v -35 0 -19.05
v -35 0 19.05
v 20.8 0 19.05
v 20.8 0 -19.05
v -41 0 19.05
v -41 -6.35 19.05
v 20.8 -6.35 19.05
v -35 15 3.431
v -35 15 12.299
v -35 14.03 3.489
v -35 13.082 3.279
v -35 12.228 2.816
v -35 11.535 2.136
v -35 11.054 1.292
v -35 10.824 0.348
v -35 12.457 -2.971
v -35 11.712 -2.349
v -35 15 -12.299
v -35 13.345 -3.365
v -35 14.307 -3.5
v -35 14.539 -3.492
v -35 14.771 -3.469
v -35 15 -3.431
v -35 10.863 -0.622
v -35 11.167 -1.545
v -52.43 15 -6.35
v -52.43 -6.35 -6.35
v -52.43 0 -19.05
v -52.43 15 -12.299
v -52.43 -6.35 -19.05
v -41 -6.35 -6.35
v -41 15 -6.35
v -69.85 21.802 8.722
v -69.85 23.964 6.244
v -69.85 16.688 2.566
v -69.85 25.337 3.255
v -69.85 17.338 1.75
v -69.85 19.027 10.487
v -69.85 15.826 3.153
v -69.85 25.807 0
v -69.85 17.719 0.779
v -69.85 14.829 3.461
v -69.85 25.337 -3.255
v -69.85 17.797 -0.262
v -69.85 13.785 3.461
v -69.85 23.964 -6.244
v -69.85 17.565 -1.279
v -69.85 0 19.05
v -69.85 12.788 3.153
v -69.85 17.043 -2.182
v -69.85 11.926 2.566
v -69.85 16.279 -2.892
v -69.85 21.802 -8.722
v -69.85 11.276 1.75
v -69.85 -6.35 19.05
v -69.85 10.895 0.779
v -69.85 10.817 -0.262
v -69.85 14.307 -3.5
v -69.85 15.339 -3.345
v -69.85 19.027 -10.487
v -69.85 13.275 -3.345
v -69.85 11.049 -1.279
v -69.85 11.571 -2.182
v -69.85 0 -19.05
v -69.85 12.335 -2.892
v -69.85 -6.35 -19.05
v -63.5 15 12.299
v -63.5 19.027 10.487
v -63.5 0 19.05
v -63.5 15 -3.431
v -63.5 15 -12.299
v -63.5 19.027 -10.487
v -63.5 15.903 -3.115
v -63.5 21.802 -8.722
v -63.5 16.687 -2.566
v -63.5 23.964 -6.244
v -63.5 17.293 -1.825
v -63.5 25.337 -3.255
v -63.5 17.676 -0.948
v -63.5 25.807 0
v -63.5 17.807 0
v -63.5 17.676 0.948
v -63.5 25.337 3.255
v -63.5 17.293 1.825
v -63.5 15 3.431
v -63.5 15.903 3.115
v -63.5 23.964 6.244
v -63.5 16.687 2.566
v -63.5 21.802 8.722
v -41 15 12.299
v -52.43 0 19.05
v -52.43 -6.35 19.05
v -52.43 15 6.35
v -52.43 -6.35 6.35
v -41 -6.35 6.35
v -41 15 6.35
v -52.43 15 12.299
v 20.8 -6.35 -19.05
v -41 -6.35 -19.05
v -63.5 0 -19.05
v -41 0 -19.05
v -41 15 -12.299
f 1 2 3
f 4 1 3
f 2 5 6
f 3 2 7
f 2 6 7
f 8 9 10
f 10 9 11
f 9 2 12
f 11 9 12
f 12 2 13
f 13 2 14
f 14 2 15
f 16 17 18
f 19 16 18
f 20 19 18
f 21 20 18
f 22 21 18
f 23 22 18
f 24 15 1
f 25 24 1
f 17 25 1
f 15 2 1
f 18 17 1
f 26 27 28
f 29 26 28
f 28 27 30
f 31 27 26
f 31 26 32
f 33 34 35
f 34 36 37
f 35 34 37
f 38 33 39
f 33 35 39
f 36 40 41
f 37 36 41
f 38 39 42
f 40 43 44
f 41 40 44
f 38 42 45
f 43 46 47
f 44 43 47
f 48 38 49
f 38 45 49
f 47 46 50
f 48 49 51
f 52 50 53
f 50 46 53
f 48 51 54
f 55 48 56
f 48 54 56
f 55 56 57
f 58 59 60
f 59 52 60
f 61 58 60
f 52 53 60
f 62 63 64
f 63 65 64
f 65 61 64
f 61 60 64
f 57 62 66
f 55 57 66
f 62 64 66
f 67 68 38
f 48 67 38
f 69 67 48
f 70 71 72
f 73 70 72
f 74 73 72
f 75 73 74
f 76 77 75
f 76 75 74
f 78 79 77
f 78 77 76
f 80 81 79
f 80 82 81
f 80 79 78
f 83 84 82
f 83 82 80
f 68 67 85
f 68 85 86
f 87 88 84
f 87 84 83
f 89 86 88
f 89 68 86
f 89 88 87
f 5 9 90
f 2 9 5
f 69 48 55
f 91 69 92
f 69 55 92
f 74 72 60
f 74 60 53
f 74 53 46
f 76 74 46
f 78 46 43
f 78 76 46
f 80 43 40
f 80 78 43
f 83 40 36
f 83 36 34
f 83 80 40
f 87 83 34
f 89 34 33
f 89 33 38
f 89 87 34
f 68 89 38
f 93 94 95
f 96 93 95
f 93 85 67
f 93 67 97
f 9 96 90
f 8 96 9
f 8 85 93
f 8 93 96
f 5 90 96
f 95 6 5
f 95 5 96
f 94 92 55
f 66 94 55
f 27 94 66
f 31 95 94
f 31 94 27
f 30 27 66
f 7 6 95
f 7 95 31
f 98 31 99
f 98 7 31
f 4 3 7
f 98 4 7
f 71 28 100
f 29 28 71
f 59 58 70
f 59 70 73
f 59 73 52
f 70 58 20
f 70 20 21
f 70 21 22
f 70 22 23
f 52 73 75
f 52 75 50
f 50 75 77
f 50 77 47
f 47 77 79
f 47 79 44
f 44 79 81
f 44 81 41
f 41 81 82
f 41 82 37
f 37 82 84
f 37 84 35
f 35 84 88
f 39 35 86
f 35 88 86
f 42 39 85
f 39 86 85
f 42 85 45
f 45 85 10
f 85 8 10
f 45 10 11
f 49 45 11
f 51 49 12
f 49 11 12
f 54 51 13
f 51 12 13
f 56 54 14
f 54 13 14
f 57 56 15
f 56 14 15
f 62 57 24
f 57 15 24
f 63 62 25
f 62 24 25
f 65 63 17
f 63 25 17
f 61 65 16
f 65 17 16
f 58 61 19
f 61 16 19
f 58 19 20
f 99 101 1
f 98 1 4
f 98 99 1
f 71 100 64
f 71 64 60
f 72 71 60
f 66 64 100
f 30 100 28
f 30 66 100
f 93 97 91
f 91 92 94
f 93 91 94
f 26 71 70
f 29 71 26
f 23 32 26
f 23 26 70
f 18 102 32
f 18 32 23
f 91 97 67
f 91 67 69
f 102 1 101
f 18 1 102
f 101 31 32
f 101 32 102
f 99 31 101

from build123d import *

# Parameters (mm, degrees)
SKETCH5_W                = 33.357089
SKETCH5_H                = 38.1
BOSS_EXTRUDE2_DEPTH      = 20.8
BOSS_EXTRUDE2_DEPTH_BACK = 69.85
SKETCH6_W                = 84.3
SKETCH6_H                = 27.007089
CUT_EXTRUDE1_DEPTH       = 39.1
SKETCH7_R                = 3.5
CUT_EXTRUDE2_DEPTH       = 21.8
CUT_EXTRUDE2_DEPTH_BACK  = 70.85
CUT_EXTRUDE3_DEPTH       = 70.85
SKETCH9_W                = 28.5
SKETCH9_H                = 38.1
BOSS_EXTRUDE3_DEPTH      = 15
CUT_EXTRUDE4_DEPTH       = 70.85
SKETCH11_R               = 3.5
CUT_EXTRUDE5_DEPTH       = 70.85
SKETCH13_W               = 11.43
SKETCH13_H               = 25.4
CUT_EXTRUDE6_DEPTH       = 26.807089
CUT_EXTRUDE6_DEPTH_BACK  = 7.35


with BuildPart() as part:
    # Sketch5 → Boss-Extrude2 (new body, two sides)
    with BuildSketch(Plane(origin=(0, 0, 0), x_dir=(0, -1, 0), z_dir=(1, 0, 0))) as boss_extrude2_sk:
        with Locations((-10.3285445, 0)):
            Rectangle(SKETCH5_W, SKETCH5_H)
    extrude(amount=BOSS_EXTRUDE2_DEPTH)
    extrude(boss_extrude2_sk.sketch, amount=-BOSS_EXTRUDE2_DEPTH_BACK)

    # Sketch6 → Cut-Extrude1 (cut, through all)
    with BuildSketch(Plane.XY.offset(19.05)):
        with Locations((-21.35, 13.5035445)):
            Rectangle(SKETCH6_W, SKETCH6_H)
    extrude(amount=-CUT_EXTRUDE1_DEPTH, mode=Mode.SUBTRACT)

    # Sketch7 → Cut-Extrude2 (cut, two sides)
    with BuildSketch(Plane(origin=(0, 0, 0), x_dir=(0, 0, -1), z_dir=(1, 0, 0))) as cut_extrude2_sk:
        with Locations((0, 14.307089)):
            Circle(SKETCH7_R)
    extrude(amount=CUT_EXTRUDE2_DEPTH, mode=Mode.SUBTRACT)
    extrude(cut_extrude2_sk.sketch, amount=-CUT_EXTRUDE2_DEPTH_BACK, mode=Mode.SUBTRACT)

    # Sketch8 → Cut-Extrude3 (cut, through all)
    with BuildSketch(Plane(origin=(0, 0, 0), x_dir=(0, 0, -1), z_dir=(1, 0, 0))):
        with BuildLine():
            Line((19.05, 0), (10.486875479, 19.026775715))
            ThreePointArc((10.486875479, 19.026775715), (0, 25.807089), (-10.486875479, 19.026775715))
            Line((-10.486875479, 19.026775715), (-19.05, 0))
            Line((-19.05, 0), (-19.05, 27.007089))
            Line((-19.05, 27.007089), (19.05, 27.007089))
            Line((19.05, 27.007089), (19.05, 0))
        make_face()
    extrude(amount=-CUT_EXTRUDE3_DEPTH, mode=Mode.SUBTRACT)

    # Sketch9 → Boss-Extrude3 (add)
    with BuildSketch(Plane(origin=(0, 0, 0), x_dir=(1, 0, 0), z_dir=(0, 1, 0))):
        with Locations((-49.25, 0)):
            Rectangle(SKETCH9_W, SKETCH9_H)
    extrude(amount=BOSS_EXTRUDE3_DEPTH)

    # Sketch10 → Cut-Extrude4 (cut, through all)
    with BuildSketch(Plane(origin=(0, 0, 0), x_dir=(0, 0, -1), z_dir=(1, 0, 0))):
        Polygon((19.05, 42.328016658), (19.05, 0), (0, 42.328016658), align=None)
        Polygon((-19.05, 42.328016658), (0, 42.328016658), (-19.05, 0), align=None)
    extrude(amount=-CUT_EXTRUDE4_DEPTH, mode=Mode.SUBTRACT)

    # Sketch11 → Cut-Extrude5 (cut, through all)
    with BuildSketch(Plane(origin=(0, 0, 0), x_dir=(0, 0, -1), z_dir=(1, 0, 0))):
        with Locations((0, 14.307089)):
            Circle(SKETCH11_R)
    extrude(amount=-CUT_EXTRUDE5_DEPTH, mode=Mode.SUBTRACT)

    # Sketch13 → Cut-Extrude6 (cut, two sides)
    with BuildSketch(Plane(origin=(0, 0, 0), x_dir=(1, 0, 0), z_dir=(0, 1, 0))) as cut_extrude6_sk:
        with Locations((-46.715, -19.05)):
            Rectangle(SKETCH13_W, SKETCH13_H)
        with Locations((-46.715, 19.05)):
            Rectangle(SKETCH13_W, SKETCH13_H)
    extrude(amount=CUT_EXTRUDE6_DEPTH, mode=Mode.SUBTRACT)
    extrude(cut_extrude6_sk.sketch, amount=-CUT_EXTRUDE6_DEPTH_BACK, mode=Mode.SUBTRACT)


solid = part.part
